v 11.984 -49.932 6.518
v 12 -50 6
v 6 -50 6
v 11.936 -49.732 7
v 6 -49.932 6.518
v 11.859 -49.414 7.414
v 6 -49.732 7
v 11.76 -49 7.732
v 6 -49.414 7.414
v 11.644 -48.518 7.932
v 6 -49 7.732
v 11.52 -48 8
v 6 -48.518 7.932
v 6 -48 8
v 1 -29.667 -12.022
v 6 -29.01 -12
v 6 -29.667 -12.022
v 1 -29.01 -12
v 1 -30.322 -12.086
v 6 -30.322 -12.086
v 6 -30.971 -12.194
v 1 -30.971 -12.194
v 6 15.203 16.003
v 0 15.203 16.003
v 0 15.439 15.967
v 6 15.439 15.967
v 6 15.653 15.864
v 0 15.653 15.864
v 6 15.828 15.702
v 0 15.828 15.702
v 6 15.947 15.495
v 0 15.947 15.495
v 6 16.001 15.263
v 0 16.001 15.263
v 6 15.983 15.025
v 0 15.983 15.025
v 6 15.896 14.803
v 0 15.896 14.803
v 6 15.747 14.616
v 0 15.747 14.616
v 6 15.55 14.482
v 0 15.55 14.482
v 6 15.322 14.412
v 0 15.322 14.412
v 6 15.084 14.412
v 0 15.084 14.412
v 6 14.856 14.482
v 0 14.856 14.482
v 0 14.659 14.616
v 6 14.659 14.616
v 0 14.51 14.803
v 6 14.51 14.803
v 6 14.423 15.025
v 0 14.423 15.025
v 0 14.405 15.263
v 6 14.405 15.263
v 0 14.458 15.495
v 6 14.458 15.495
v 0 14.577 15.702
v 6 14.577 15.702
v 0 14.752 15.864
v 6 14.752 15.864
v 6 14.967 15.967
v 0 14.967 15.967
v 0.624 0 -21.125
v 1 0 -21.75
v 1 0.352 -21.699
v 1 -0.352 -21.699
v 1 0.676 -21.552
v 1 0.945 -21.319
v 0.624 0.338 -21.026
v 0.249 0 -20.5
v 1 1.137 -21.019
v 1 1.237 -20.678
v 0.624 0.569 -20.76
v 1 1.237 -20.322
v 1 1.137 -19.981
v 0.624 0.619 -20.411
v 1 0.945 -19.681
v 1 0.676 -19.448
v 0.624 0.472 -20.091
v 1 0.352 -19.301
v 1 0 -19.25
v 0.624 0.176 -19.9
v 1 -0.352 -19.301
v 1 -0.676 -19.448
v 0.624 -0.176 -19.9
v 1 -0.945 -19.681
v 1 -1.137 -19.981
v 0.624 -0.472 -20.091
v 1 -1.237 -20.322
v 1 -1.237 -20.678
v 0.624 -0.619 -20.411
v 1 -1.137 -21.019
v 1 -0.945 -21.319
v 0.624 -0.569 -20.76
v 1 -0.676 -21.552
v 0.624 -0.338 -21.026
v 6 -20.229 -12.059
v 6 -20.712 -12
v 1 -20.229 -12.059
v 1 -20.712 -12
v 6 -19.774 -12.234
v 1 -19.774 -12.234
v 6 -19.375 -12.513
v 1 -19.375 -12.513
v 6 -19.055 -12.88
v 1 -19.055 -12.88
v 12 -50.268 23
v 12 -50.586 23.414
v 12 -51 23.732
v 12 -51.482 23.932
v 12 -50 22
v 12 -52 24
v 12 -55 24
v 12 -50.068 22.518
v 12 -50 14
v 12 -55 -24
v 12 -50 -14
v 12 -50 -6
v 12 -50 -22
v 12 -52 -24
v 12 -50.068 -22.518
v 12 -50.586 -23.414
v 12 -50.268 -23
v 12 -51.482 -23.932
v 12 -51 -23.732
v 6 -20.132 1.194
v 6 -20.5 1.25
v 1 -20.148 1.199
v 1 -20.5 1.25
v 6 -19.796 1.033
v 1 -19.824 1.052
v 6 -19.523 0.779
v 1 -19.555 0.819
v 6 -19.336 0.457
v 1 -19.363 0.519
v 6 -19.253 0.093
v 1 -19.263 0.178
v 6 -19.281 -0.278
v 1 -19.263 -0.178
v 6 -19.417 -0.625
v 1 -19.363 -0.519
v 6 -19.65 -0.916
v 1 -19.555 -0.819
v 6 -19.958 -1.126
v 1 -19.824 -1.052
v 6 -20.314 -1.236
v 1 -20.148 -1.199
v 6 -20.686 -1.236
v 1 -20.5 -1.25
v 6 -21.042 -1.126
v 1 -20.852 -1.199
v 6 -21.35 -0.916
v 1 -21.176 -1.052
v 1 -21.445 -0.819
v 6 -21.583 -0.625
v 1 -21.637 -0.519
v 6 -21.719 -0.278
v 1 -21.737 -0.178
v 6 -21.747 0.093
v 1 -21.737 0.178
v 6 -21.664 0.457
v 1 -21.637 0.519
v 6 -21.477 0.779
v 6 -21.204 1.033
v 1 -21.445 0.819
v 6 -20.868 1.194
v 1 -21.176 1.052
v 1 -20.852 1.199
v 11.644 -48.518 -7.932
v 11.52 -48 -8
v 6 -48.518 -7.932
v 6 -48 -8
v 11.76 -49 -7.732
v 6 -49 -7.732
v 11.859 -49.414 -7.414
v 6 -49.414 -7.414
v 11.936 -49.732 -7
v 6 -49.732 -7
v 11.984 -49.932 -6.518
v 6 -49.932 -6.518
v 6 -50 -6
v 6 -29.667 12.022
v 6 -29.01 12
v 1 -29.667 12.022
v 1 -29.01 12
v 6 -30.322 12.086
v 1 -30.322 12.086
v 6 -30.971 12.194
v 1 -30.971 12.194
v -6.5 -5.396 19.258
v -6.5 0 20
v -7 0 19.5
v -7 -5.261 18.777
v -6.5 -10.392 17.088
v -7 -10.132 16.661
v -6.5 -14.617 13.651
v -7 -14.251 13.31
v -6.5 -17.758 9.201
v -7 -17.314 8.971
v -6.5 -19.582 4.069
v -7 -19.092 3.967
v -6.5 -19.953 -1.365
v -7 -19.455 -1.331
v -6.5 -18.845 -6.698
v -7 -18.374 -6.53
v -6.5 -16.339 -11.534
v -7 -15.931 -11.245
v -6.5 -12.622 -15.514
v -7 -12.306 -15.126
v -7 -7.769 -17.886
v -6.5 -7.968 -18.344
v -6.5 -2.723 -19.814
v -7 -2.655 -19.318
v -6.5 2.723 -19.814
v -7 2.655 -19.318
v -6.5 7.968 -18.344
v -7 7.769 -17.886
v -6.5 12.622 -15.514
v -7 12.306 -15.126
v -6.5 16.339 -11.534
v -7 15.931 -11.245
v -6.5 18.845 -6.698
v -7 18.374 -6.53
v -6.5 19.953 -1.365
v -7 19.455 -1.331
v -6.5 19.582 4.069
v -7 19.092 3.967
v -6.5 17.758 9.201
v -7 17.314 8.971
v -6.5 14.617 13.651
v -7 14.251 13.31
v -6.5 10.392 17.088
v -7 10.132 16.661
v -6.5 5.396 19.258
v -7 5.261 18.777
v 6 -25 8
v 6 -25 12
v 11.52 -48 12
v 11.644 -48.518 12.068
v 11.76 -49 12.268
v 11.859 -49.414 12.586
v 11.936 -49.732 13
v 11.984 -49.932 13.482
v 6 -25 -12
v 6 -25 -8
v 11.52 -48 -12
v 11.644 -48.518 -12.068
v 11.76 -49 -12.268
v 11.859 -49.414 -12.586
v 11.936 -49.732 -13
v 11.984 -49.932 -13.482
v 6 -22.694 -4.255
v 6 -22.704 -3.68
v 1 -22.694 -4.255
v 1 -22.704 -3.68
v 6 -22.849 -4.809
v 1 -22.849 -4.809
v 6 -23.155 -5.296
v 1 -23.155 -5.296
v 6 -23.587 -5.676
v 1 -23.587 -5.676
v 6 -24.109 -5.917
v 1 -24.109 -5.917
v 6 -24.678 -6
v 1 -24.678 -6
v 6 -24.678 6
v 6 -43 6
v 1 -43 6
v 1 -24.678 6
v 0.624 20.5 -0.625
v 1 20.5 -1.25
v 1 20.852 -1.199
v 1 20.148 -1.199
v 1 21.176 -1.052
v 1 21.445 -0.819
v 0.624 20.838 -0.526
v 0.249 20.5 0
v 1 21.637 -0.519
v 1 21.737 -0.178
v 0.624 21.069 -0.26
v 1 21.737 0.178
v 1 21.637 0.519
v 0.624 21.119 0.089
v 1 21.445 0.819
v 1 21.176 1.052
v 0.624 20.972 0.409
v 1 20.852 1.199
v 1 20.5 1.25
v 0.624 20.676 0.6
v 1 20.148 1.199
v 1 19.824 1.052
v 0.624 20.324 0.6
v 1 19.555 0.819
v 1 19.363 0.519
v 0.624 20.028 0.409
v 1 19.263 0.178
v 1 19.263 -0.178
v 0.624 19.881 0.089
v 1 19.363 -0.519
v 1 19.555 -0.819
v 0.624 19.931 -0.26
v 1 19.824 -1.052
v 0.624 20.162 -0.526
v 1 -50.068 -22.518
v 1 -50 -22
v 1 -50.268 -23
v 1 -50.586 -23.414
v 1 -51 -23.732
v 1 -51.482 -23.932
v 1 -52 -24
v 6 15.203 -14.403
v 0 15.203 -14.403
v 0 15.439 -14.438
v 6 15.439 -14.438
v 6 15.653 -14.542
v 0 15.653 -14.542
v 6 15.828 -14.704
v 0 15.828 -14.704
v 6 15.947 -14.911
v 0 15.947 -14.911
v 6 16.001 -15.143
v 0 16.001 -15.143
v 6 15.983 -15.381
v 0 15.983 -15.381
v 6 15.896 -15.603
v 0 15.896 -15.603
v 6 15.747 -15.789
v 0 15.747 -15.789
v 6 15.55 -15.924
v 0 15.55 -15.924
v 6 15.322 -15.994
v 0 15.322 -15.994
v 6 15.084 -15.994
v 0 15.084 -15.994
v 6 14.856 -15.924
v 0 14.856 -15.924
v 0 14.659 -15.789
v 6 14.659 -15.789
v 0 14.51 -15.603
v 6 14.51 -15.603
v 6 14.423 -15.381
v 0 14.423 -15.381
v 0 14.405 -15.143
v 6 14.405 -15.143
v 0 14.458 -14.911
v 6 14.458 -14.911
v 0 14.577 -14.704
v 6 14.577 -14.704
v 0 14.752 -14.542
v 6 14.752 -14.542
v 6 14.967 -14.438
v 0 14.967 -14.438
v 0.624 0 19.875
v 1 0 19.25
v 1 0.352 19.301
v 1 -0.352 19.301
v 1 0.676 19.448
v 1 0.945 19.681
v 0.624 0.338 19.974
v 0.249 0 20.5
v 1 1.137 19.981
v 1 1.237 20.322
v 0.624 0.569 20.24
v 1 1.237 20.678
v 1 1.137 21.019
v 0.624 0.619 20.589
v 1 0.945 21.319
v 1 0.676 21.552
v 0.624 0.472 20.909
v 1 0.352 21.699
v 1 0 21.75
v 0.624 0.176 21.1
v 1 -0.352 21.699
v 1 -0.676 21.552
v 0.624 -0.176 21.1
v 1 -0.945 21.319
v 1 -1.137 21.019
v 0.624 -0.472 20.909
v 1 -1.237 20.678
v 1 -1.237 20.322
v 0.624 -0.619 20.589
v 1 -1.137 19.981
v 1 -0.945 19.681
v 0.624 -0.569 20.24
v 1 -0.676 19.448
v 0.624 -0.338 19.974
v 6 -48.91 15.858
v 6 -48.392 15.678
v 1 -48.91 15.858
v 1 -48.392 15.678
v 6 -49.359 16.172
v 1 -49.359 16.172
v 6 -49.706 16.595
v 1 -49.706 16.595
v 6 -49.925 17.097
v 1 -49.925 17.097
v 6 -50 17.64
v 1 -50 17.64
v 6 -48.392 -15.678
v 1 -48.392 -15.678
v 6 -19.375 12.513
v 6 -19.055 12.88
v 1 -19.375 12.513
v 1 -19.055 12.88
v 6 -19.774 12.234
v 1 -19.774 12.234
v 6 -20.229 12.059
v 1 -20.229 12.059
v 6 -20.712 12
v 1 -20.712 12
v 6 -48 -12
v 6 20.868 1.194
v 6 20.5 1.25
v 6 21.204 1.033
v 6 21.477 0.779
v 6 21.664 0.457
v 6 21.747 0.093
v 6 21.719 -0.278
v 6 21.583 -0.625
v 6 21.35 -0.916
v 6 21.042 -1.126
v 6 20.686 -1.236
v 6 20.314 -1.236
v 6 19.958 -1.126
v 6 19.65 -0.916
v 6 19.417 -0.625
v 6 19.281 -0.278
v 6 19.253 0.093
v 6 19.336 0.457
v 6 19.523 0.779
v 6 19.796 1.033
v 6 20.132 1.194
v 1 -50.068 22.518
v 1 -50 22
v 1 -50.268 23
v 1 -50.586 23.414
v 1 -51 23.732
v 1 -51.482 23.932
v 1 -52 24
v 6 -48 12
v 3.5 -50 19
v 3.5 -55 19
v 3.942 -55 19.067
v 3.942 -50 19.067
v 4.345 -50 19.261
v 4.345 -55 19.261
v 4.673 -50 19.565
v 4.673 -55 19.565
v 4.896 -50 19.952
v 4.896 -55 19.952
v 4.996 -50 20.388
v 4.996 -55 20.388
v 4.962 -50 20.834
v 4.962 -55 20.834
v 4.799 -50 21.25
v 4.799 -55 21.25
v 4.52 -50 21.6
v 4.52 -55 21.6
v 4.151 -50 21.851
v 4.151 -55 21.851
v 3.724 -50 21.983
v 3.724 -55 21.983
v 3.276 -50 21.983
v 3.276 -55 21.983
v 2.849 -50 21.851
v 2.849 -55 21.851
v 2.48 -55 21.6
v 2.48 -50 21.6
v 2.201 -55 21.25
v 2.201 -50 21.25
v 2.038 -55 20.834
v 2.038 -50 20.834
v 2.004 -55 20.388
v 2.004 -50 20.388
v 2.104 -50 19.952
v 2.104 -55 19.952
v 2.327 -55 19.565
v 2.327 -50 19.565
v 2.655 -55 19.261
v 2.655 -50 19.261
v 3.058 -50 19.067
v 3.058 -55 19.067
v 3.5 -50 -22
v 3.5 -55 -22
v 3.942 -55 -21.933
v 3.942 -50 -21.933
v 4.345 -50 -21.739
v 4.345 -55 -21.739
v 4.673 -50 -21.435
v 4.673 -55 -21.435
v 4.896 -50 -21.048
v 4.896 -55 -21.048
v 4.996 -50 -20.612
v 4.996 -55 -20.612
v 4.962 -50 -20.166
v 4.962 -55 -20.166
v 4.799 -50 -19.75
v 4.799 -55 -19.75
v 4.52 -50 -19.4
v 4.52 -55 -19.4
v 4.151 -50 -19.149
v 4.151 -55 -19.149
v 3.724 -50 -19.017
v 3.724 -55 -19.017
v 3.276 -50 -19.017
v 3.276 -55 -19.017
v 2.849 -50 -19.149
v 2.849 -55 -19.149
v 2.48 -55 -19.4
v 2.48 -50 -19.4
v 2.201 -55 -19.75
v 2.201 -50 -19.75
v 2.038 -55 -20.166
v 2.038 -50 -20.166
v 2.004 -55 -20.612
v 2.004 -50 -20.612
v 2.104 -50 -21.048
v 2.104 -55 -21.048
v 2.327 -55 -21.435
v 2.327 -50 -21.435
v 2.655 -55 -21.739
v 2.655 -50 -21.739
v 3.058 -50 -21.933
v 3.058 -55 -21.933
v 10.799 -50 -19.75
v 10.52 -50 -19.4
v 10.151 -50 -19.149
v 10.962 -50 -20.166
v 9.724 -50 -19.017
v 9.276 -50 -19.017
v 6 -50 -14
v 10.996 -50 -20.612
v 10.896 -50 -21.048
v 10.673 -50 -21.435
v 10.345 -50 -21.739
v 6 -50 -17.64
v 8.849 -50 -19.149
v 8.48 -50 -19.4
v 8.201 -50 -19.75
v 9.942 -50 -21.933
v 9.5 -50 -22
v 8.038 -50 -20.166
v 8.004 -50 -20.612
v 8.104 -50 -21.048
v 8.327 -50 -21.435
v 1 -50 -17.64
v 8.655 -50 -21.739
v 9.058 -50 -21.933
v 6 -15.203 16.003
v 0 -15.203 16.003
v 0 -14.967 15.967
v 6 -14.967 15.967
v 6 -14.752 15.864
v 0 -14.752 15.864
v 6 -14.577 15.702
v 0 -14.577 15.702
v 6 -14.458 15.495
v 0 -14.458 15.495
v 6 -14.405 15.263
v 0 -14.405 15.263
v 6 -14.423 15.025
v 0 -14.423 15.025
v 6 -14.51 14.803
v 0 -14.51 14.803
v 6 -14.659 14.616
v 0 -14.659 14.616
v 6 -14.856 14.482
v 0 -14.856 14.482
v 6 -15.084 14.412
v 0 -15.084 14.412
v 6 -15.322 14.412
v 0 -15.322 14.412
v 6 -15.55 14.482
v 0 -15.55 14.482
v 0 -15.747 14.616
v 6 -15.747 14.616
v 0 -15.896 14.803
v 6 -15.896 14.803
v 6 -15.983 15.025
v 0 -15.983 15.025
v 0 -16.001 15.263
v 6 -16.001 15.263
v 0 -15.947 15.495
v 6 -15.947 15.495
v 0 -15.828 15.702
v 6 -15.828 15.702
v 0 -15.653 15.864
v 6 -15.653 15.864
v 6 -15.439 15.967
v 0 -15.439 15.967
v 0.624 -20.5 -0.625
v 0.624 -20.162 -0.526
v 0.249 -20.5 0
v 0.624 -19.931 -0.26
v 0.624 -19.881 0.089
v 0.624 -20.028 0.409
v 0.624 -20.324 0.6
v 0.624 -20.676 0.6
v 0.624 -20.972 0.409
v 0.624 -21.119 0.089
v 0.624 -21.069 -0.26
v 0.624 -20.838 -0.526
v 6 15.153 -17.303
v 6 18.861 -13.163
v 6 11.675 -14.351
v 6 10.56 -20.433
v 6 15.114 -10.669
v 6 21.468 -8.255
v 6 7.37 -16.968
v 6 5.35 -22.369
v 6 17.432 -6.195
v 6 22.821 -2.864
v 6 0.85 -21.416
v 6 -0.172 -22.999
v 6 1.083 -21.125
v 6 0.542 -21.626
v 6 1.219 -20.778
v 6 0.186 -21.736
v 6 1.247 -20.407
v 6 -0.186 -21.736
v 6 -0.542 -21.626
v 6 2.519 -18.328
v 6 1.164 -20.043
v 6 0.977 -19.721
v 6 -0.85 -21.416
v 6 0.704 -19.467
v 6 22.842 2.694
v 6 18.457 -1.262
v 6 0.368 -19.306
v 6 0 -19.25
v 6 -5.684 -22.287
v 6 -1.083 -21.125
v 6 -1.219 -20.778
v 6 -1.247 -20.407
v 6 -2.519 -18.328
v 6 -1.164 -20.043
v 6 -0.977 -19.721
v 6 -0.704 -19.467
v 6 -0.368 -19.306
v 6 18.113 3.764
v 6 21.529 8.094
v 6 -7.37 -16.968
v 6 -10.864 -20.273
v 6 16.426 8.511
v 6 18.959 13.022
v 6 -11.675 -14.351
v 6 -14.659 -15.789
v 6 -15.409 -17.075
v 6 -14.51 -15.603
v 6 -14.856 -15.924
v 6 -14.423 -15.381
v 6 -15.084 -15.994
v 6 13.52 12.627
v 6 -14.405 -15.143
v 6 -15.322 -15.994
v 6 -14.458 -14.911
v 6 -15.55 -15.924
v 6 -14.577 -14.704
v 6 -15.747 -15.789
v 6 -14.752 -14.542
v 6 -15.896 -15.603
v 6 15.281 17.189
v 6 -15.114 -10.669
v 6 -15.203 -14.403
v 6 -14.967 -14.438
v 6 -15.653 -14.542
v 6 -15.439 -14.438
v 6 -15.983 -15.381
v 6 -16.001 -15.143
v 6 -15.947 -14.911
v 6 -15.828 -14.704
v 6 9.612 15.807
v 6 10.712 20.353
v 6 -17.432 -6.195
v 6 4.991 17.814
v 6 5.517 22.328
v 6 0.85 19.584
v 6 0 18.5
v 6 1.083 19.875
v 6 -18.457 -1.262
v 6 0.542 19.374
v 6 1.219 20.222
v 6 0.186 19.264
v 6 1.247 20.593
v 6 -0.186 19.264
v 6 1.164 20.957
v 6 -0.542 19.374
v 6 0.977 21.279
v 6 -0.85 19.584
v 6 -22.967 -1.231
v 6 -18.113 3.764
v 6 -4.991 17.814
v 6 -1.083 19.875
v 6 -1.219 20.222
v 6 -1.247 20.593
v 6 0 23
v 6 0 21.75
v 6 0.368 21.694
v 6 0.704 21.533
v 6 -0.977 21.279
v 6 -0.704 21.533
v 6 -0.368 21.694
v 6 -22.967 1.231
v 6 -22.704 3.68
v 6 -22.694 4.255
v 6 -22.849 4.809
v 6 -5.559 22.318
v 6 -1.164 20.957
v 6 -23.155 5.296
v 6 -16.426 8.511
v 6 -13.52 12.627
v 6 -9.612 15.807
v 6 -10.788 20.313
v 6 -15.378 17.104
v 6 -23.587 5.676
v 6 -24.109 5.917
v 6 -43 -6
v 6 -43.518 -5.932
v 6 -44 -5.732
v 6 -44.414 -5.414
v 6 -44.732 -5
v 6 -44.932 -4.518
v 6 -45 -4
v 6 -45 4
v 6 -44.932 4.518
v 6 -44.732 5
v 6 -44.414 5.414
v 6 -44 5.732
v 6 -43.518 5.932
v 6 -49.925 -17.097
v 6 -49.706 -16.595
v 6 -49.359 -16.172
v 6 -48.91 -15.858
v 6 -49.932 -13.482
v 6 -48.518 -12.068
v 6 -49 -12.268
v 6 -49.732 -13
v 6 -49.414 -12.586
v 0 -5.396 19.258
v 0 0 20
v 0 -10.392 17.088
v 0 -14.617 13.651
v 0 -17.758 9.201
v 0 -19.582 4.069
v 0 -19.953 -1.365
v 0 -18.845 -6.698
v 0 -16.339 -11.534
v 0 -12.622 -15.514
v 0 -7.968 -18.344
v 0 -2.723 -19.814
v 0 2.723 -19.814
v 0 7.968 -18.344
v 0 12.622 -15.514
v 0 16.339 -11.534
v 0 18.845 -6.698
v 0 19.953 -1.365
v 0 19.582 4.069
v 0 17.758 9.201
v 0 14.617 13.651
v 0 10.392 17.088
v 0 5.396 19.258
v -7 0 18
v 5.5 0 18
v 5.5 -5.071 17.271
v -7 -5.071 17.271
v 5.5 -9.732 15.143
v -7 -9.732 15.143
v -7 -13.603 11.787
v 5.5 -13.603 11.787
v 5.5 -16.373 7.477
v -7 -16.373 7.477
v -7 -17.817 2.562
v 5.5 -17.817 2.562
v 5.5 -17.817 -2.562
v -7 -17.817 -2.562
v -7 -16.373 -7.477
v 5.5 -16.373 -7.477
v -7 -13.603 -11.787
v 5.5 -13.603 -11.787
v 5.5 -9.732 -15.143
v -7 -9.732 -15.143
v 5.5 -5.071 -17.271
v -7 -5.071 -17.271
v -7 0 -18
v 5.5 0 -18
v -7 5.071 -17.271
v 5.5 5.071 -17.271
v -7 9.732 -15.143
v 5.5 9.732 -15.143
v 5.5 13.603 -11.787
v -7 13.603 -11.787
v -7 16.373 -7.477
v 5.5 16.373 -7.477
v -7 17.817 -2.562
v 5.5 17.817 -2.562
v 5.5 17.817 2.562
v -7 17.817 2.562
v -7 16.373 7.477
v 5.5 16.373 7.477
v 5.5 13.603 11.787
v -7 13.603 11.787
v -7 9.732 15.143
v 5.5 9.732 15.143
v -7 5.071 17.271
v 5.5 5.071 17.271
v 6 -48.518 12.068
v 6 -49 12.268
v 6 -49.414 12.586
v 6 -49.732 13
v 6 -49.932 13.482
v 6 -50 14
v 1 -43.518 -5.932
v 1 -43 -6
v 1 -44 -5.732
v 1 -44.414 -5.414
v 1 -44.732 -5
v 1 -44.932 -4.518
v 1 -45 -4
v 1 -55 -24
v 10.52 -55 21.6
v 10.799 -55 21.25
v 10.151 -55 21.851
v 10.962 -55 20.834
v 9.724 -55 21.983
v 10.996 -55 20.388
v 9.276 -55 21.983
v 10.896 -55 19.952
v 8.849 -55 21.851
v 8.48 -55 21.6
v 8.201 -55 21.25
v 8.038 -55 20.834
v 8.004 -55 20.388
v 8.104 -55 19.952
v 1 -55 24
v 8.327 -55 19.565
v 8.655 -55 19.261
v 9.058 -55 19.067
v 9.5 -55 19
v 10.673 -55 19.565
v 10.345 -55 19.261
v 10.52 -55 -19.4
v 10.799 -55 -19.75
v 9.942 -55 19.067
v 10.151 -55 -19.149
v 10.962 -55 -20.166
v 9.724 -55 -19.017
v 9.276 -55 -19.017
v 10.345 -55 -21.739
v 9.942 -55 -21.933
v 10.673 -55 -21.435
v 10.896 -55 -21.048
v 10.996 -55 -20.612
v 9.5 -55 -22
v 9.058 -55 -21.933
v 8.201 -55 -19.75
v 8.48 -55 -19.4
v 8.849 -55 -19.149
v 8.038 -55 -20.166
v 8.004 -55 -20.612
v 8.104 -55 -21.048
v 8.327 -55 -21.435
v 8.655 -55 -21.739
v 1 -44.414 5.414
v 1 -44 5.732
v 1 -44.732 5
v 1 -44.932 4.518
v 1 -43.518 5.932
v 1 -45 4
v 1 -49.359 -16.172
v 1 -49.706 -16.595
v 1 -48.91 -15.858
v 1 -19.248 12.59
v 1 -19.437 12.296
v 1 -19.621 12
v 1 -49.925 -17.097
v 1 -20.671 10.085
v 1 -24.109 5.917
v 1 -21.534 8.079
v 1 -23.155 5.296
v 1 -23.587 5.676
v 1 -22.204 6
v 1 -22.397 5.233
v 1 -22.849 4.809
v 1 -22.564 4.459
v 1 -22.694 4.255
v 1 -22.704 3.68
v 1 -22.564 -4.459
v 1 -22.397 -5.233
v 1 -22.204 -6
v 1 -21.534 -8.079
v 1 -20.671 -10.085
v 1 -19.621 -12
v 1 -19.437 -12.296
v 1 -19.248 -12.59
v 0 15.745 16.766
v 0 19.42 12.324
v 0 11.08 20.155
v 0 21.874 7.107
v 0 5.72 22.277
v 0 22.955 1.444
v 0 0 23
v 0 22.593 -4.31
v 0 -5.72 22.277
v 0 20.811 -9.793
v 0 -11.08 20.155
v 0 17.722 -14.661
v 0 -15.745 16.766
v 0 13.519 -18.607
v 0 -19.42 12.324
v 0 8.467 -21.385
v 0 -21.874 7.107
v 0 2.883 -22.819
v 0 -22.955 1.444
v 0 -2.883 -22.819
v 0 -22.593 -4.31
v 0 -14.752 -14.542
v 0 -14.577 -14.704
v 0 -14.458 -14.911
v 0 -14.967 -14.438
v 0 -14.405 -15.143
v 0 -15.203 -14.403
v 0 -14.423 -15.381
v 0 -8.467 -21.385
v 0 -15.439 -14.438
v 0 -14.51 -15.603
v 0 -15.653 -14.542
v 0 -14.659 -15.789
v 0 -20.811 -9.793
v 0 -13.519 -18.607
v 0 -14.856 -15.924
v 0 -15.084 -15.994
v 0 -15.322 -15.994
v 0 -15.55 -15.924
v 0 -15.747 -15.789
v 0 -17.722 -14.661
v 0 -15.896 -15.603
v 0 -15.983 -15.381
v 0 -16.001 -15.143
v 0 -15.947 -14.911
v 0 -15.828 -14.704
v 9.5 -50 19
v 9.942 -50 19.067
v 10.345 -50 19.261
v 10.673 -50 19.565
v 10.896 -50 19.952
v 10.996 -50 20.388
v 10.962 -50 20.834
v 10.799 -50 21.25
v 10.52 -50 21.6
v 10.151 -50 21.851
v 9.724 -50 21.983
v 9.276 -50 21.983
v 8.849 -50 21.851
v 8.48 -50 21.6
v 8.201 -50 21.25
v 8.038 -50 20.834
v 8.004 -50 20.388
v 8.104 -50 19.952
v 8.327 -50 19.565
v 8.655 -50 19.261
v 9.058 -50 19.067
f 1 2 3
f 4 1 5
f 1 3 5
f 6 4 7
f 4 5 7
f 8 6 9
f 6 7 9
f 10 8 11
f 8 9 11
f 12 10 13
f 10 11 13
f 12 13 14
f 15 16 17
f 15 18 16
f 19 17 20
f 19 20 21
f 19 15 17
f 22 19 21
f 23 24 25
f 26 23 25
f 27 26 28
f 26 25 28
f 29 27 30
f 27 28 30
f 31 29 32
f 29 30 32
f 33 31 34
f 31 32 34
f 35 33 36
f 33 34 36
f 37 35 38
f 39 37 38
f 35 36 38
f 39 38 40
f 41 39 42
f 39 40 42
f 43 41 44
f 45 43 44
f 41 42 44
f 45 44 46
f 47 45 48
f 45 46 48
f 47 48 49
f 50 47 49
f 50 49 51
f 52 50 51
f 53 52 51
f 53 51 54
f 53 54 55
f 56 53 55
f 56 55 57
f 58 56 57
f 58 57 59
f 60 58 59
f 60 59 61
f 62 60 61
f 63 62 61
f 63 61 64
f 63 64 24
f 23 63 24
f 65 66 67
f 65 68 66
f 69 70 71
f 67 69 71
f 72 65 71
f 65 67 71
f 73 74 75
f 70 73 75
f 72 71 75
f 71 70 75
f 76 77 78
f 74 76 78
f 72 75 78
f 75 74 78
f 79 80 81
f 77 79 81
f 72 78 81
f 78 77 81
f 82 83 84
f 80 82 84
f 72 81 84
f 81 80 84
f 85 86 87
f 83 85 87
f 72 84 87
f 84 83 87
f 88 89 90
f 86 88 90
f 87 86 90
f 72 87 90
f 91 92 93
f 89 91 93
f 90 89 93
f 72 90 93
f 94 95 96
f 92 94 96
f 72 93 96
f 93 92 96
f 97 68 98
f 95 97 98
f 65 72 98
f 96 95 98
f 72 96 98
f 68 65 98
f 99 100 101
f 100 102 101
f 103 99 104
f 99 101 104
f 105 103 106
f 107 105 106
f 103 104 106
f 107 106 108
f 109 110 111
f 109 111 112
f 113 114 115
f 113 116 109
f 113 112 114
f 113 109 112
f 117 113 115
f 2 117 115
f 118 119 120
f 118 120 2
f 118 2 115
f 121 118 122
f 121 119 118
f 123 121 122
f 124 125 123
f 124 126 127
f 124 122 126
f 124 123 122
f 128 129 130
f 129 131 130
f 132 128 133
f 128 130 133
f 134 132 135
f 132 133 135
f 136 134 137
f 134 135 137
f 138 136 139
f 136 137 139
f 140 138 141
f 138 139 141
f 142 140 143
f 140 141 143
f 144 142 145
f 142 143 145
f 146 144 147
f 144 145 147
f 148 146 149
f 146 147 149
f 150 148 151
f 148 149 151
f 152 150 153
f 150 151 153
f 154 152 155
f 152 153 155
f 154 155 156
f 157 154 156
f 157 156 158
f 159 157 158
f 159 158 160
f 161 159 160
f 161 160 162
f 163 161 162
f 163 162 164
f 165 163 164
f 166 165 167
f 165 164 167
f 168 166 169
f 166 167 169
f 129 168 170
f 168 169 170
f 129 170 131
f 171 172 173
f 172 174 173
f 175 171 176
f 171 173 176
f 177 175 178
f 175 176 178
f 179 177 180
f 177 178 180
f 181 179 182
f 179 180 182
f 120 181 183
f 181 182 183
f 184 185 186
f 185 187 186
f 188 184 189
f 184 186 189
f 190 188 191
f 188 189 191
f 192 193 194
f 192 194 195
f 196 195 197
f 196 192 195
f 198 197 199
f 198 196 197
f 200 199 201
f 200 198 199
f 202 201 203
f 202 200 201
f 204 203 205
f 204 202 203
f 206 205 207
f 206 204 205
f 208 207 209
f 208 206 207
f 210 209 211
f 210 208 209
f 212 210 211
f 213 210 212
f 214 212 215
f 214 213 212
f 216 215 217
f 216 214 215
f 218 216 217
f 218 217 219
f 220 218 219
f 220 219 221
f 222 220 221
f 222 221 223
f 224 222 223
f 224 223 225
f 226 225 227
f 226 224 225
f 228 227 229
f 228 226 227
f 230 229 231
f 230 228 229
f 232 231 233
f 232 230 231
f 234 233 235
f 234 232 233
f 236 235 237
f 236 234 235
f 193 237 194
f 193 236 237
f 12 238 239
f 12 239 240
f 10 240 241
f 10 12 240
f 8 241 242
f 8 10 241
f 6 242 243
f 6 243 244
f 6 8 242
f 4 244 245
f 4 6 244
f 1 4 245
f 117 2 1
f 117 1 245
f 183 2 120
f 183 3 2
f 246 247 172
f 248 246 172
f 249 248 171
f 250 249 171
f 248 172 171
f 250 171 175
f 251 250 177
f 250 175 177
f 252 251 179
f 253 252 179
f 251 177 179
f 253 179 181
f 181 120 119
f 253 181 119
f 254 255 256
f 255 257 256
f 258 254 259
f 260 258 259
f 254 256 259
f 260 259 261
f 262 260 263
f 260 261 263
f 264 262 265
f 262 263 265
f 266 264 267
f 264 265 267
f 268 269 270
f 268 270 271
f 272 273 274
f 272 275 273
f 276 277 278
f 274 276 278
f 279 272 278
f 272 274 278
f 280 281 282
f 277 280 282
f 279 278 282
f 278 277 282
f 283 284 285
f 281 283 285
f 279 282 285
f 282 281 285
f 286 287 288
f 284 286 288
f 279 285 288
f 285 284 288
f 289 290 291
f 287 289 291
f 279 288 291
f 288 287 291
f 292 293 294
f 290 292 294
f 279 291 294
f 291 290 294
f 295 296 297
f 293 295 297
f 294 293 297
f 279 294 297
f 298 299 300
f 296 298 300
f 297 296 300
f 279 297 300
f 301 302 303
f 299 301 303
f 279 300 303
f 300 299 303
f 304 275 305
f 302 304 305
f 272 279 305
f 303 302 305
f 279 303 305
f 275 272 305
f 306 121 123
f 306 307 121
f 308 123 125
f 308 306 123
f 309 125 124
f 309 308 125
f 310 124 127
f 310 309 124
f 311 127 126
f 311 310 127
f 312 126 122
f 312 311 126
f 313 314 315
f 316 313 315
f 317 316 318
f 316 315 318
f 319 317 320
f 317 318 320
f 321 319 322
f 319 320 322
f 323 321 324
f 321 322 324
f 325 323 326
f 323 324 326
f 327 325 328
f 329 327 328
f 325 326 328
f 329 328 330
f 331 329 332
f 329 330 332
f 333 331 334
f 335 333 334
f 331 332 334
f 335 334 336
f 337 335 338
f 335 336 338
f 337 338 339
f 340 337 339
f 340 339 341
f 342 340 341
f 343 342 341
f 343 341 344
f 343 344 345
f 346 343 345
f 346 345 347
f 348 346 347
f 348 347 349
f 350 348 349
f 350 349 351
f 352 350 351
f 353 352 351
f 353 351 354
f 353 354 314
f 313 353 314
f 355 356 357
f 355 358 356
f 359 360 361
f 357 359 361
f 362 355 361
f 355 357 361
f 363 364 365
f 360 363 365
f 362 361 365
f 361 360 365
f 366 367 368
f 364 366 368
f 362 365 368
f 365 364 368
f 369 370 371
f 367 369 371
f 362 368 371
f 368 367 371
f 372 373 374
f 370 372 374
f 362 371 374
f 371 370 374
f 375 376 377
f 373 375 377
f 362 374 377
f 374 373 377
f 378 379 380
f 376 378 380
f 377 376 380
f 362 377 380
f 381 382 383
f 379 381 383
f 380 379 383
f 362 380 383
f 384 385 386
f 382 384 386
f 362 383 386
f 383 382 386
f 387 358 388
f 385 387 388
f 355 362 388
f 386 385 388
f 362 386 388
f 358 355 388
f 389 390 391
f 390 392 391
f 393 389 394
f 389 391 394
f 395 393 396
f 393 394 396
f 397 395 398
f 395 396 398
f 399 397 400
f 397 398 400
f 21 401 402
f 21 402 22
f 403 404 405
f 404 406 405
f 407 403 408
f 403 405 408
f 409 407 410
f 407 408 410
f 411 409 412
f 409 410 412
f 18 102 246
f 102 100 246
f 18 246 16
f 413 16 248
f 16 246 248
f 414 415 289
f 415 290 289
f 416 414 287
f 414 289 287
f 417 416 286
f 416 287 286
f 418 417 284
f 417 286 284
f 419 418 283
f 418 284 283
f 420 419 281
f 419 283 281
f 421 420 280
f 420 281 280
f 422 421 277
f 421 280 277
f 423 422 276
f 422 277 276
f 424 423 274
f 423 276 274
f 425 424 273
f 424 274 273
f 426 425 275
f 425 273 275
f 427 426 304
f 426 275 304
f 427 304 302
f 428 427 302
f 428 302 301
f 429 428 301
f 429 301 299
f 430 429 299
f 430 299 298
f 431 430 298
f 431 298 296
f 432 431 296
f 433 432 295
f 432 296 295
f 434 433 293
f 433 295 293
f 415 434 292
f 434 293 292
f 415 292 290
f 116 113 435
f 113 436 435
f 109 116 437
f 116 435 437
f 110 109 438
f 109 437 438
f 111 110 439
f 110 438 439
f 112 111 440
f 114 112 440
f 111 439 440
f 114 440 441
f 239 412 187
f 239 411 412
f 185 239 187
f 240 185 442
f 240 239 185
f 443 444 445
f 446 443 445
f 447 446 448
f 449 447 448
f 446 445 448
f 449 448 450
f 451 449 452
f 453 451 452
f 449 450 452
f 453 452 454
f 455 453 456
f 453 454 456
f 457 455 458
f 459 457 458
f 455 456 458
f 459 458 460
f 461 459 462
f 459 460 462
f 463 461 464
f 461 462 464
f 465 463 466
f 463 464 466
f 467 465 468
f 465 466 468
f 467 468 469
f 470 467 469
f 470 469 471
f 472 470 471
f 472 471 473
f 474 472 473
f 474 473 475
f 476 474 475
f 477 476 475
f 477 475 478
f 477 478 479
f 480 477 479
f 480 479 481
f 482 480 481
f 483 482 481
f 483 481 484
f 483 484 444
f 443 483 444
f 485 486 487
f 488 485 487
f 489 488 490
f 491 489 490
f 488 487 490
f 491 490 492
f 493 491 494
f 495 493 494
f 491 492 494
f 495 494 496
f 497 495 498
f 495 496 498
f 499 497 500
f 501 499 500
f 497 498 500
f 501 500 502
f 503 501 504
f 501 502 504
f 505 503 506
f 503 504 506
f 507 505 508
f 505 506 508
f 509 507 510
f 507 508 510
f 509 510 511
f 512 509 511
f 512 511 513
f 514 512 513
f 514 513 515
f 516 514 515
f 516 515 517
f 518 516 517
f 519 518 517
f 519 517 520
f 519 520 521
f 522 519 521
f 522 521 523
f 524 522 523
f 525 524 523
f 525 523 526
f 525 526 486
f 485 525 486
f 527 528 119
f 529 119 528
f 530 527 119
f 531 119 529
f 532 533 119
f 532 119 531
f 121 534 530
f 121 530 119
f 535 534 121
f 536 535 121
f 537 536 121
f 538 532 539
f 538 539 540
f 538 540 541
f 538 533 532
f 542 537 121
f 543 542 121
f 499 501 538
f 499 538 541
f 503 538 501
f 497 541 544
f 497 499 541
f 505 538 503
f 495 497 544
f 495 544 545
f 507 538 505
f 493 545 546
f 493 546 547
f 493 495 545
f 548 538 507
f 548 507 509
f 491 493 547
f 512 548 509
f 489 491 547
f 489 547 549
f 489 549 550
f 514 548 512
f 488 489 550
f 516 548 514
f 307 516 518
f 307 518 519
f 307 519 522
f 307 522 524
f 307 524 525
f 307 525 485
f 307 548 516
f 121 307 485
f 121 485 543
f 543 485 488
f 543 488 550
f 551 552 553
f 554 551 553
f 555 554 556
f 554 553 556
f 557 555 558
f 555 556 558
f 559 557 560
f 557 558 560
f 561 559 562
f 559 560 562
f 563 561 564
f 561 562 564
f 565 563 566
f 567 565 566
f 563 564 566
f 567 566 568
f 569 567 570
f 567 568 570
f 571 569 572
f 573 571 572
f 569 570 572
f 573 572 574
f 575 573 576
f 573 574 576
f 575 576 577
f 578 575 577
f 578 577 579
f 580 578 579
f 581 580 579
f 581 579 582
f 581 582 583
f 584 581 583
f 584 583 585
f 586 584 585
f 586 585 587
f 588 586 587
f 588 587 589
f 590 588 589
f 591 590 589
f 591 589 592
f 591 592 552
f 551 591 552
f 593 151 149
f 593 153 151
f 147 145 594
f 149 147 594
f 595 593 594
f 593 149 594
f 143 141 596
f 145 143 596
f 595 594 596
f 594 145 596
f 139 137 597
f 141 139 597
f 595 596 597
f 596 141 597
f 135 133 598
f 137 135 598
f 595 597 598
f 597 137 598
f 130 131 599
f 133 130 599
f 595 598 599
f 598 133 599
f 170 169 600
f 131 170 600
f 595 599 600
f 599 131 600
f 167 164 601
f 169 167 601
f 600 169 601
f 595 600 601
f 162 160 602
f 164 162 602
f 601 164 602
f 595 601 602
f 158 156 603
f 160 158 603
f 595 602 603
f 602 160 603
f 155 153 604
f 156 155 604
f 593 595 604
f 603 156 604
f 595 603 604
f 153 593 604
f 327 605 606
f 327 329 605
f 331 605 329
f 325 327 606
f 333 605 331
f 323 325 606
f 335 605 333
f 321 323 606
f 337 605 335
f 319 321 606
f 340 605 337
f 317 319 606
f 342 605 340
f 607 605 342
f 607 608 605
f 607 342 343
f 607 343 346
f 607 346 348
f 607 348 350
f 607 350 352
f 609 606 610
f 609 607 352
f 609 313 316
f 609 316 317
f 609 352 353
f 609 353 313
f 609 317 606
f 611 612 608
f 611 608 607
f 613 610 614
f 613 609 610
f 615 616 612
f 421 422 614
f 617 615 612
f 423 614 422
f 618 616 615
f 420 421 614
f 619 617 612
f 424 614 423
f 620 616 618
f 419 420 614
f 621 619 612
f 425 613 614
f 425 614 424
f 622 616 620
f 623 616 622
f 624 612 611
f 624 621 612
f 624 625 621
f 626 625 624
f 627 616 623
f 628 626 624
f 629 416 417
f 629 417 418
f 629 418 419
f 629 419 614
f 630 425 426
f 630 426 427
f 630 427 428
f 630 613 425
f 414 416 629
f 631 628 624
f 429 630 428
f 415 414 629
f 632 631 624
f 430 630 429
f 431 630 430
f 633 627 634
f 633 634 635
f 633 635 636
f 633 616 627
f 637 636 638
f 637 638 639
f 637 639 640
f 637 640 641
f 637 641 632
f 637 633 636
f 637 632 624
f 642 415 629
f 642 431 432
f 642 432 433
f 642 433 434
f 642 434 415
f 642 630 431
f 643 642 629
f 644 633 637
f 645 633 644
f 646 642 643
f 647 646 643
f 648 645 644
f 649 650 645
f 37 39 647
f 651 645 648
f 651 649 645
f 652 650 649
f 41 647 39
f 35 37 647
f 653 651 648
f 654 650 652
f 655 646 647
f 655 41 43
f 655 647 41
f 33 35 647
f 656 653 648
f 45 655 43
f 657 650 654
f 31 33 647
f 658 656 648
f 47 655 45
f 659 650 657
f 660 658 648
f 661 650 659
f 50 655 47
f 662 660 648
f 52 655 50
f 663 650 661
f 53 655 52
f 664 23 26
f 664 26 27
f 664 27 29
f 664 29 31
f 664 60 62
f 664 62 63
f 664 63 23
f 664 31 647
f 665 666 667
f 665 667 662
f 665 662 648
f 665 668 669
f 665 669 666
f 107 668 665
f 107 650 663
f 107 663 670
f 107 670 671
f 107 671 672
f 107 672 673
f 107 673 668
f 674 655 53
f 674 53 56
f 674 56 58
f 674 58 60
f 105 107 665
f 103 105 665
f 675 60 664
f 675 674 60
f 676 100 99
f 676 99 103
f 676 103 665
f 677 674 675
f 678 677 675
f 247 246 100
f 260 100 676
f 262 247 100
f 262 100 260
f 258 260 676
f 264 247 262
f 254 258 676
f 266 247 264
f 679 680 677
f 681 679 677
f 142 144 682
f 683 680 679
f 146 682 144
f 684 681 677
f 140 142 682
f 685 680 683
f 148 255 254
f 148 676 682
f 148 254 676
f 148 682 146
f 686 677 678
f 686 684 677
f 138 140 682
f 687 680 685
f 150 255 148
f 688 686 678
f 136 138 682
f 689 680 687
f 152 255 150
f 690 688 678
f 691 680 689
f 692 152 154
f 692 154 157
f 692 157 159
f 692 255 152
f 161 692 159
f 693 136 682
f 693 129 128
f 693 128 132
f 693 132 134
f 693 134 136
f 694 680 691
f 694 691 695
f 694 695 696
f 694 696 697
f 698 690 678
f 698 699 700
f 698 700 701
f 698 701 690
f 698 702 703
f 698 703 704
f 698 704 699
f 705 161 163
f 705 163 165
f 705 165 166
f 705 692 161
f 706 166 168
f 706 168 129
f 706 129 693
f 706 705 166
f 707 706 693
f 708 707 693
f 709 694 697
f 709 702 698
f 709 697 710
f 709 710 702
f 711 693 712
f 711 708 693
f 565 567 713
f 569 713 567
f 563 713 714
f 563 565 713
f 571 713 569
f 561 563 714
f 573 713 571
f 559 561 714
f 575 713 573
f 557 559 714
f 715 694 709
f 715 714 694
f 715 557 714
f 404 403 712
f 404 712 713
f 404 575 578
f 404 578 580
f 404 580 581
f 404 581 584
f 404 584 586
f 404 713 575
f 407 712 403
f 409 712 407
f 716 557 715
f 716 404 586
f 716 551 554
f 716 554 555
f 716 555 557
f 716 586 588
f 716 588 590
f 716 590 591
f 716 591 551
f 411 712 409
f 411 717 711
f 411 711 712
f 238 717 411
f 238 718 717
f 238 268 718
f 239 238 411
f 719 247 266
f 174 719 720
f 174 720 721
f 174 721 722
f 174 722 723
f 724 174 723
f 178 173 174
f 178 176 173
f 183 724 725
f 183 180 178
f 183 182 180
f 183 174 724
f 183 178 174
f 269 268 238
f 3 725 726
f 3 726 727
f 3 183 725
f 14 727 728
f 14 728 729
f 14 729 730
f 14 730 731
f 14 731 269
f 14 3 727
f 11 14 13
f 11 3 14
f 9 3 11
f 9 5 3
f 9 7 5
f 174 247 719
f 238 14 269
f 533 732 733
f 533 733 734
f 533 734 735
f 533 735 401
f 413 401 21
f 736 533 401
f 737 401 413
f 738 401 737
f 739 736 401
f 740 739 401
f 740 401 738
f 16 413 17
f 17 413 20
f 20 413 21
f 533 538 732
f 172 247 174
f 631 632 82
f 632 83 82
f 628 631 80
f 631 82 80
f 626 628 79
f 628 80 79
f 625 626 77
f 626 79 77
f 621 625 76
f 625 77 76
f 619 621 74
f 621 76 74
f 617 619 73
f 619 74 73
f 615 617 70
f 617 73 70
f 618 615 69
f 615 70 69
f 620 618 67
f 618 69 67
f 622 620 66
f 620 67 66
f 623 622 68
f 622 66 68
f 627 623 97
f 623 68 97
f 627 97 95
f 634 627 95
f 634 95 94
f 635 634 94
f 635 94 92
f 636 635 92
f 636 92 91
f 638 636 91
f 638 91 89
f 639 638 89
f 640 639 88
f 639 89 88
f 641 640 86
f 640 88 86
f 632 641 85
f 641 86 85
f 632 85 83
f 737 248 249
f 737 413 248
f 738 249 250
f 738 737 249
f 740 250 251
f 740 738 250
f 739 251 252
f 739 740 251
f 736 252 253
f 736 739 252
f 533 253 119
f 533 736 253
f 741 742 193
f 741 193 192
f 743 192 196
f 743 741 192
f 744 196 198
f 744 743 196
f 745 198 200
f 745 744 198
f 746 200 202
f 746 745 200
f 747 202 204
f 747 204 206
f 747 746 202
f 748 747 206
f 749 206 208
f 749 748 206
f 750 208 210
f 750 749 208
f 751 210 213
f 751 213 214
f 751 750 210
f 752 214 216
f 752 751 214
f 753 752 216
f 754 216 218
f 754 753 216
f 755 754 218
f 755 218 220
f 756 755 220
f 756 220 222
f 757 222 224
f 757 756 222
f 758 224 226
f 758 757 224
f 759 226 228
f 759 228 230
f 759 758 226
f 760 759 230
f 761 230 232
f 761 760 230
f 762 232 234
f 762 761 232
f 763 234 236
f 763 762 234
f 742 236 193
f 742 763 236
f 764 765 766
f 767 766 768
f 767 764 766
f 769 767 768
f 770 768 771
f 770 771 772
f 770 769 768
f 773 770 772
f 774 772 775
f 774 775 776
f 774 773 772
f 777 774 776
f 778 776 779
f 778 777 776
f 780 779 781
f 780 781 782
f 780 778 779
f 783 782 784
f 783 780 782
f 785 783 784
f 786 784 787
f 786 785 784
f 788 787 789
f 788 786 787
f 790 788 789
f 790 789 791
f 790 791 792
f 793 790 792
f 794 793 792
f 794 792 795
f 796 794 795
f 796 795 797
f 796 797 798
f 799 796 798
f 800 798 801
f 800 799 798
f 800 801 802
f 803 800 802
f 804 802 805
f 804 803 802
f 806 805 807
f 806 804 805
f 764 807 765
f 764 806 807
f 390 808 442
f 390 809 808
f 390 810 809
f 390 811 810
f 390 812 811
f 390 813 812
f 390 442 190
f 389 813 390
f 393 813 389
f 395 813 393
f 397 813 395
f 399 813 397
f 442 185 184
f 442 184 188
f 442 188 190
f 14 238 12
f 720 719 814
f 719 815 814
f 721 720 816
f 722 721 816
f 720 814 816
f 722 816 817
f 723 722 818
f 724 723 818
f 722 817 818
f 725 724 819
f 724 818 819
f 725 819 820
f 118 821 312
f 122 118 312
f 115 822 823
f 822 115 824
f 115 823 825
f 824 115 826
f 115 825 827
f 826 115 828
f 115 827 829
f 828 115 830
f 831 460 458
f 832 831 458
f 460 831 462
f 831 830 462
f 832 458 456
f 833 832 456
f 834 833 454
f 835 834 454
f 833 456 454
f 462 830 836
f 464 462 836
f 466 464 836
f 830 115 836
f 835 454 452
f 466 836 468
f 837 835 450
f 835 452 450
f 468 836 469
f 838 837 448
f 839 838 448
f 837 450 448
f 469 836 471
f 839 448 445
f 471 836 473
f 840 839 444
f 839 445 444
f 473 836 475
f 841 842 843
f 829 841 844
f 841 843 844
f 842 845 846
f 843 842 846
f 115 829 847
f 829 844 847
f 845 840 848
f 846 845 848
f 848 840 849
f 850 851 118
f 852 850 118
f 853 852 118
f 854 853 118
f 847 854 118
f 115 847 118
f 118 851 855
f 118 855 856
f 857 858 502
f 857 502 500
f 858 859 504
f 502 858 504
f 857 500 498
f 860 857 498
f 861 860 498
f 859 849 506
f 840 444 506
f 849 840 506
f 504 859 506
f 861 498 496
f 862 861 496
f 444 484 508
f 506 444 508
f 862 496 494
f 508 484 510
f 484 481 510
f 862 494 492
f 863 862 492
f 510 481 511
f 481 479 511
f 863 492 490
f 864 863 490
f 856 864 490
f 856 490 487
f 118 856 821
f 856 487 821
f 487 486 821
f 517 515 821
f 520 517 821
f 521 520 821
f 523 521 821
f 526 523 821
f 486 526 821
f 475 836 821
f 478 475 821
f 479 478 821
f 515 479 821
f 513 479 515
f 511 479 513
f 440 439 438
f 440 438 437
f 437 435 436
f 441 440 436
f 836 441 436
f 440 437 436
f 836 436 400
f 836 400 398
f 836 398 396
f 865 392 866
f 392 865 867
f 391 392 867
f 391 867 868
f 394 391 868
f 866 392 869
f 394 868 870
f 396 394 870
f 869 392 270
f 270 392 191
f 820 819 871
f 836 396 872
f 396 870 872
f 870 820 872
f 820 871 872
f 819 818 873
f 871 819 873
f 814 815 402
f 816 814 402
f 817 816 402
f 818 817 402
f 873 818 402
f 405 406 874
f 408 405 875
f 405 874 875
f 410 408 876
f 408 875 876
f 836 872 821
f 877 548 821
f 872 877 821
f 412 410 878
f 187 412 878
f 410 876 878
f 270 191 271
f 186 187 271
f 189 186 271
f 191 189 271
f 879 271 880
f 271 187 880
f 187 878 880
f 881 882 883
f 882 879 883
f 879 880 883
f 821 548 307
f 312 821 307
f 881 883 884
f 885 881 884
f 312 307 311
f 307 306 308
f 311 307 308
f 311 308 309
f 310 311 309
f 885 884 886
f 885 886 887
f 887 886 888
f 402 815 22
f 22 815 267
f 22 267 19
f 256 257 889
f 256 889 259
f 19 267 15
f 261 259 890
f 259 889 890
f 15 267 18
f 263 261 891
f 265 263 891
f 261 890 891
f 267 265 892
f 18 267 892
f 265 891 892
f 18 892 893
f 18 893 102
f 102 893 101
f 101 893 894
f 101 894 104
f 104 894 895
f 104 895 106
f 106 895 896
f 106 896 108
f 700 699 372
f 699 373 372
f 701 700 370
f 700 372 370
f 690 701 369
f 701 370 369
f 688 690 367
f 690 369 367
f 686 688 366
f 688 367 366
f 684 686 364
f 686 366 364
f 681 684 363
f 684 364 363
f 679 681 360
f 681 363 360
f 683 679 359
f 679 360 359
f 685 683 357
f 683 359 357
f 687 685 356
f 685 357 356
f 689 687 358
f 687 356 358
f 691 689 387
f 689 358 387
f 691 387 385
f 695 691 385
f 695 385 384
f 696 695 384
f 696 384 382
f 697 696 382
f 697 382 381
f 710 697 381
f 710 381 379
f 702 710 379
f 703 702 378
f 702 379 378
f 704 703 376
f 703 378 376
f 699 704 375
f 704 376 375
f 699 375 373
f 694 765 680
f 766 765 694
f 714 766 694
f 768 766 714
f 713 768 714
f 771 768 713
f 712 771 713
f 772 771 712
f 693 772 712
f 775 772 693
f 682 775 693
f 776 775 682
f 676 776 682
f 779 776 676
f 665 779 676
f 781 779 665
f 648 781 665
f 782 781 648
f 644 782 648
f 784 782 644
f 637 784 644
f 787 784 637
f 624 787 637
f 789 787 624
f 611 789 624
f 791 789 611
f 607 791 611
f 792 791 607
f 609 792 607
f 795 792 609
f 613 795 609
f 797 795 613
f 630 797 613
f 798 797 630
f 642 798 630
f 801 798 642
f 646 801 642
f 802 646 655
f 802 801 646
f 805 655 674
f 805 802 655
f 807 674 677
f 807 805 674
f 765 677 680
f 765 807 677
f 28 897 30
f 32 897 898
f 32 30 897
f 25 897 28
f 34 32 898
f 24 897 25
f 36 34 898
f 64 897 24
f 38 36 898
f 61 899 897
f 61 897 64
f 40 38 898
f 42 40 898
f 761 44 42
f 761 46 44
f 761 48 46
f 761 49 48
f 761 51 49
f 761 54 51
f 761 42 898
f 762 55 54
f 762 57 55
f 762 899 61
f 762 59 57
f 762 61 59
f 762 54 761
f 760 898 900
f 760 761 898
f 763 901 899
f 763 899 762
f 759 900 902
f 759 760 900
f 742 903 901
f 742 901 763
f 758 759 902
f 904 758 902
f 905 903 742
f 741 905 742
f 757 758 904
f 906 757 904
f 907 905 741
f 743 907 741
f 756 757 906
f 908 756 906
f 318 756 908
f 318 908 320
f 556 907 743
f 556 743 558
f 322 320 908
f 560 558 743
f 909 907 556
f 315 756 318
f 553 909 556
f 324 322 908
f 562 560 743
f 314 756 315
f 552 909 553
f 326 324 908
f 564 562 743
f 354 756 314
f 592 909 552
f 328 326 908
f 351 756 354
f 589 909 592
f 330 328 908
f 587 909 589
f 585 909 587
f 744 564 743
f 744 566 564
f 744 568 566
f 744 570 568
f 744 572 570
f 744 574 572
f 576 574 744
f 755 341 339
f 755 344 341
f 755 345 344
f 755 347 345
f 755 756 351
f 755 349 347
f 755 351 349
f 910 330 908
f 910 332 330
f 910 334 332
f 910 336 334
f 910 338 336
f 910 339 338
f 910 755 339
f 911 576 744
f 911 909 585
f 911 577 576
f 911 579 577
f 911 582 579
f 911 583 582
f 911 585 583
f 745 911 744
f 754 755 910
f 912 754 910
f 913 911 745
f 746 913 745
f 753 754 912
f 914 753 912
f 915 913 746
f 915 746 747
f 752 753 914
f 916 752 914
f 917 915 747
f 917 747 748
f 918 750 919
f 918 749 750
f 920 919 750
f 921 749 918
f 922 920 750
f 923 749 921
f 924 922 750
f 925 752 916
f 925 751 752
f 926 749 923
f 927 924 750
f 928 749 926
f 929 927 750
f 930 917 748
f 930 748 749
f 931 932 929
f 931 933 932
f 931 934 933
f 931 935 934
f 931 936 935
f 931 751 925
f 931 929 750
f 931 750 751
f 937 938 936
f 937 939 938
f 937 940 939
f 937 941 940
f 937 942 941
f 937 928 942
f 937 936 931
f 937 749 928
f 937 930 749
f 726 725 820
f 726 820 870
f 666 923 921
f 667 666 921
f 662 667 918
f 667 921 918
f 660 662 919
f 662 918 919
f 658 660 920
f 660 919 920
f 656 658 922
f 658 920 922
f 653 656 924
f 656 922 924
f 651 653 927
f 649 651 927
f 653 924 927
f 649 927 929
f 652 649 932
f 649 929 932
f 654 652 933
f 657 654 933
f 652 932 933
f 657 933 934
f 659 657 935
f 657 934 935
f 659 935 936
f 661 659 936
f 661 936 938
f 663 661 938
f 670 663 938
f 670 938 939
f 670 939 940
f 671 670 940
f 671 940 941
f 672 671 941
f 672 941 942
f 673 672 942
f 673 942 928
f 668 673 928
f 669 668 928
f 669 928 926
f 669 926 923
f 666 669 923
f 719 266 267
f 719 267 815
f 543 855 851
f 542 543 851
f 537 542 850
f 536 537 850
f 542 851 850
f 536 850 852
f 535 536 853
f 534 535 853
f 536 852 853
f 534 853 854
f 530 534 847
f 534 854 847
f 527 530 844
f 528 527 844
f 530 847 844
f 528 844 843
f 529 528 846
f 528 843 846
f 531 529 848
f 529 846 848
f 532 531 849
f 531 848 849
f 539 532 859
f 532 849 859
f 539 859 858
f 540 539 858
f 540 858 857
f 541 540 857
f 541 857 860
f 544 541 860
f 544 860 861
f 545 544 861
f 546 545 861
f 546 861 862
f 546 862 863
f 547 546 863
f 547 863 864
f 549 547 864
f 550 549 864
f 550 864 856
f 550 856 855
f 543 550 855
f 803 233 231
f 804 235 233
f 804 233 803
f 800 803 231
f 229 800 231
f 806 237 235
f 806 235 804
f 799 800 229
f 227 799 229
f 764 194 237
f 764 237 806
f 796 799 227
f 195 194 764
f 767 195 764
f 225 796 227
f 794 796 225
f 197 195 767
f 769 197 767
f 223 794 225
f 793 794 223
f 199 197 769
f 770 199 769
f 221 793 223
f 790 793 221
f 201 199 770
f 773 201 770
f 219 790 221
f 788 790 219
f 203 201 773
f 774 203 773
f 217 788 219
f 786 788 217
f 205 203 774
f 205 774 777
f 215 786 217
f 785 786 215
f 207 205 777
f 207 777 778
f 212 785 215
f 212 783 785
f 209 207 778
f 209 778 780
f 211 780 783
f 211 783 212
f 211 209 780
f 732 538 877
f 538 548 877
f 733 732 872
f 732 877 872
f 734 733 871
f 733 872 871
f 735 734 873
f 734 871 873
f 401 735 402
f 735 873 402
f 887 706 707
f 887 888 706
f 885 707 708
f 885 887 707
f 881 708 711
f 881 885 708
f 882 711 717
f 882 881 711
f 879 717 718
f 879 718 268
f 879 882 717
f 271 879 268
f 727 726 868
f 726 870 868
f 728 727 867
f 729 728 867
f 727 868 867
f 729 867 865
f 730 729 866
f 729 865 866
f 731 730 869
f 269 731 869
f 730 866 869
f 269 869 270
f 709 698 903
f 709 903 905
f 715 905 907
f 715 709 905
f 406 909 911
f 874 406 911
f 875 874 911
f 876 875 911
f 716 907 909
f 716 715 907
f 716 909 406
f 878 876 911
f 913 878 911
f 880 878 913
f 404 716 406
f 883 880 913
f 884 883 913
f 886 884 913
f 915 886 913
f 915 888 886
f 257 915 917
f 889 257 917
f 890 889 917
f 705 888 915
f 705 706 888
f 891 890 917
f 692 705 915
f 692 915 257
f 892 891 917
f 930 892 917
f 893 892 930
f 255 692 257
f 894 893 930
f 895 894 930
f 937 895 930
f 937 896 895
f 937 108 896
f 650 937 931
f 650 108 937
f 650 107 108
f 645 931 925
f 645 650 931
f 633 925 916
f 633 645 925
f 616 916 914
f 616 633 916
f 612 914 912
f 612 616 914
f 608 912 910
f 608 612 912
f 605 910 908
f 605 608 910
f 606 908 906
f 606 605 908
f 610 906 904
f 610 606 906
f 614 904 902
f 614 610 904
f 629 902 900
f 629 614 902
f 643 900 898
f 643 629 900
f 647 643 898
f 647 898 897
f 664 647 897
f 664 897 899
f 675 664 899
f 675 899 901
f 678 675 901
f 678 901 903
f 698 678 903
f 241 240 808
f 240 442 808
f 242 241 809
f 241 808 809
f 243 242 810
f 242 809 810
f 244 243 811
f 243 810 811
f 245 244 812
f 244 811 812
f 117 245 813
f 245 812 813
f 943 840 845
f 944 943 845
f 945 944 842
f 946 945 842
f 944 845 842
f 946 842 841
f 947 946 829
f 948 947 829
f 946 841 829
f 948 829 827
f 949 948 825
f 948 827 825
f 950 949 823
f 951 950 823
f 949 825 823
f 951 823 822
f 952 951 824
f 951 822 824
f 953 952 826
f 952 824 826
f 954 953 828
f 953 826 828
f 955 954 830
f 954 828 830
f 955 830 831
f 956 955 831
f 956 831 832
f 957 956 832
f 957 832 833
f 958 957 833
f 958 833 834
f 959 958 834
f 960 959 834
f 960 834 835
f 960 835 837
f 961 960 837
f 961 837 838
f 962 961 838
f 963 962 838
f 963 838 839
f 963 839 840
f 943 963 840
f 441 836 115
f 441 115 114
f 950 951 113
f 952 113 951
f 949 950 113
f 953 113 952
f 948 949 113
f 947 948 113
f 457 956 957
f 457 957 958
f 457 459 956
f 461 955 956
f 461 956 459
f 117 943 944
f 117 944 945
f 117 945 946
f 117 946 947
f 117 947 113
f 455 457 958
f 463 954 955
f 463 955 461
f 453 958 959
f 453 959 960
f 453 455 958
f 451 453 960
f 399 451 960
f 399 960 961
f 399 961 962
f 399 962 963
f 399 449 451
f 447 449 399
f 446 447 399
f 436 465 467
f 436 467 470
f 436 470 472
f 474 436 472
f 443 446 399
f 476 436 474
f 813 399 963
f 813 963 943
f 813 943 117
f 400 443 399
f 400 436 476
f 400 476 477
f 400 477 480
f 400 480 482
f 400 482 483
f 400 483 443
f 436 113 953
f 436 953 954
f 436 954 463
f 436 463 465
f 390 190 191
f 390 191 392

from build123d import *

# Parameters (mm, degrees)
EXTRUDE_1_DEPTH        = 5
SKETCH_16_W            = 48
SKETCH_16_H            = 5
EXTRUDE_3_DEPTH        = 11
CUT_EXTRUDE_4_REACH    = 84.486
SKETCH_5_R             = 1.5
RIB_1_REACH            = 68.821
SKETCH_17_WALL_W       = 161.351231242
SKETCH_17_WALL_H       = 4
FILLET_1_R             = 2
HOLE_WIZARD_M3_2_D     = 2.5
HOLE_WIZARD_M3_2_DEPTH = 5
HOLE_WIZARD_M3_2_TIP   = 0.751075774
HOLE_WIZARD_M2_1_D     = 1.6
CHAMFER_1_SIZE         = 0.5
FILLET_2_R             = 10


with BuildPart() as part:
    # 草图3 → 旋转1 (revolve)
    with BuildSketch(Plane.XY, mode=Mode.PRIVATE) as revolve_1_sk:
        Polygon((6, 18), (-7, 18), (-7, 20), (0, 20), (0, 23), (6, 23), align=None)
    revolve(revolve_1_sk.sketch.rotate(Axis((-123.647082632, 0, 0), (1, 0, 0)), 90), axis=Axis((-123.647082632, 0, 0), (1, 0, 0)))

    # 草图4 → 凸台-拉伸1 (add)
    with BuildSketch(Plane(origin=(6, 0, 0), x_dir=(0, 0, -1), z_dir=(1, 0, 0))):
        with BuildLine():
            Line((-12, -19.62141687), (-12, -30))
            Line((-12, -30), (-16, -50))
            Line((-16, -50), (-24, -50))
            Line((-24, -50), (-24, -55))
            Line((-24, -55), (24, -55))
            Line((24, -55), (24, -50))
            Line((24, -50), (16, -50))
            Line((16, -50), (12, -30))
            Line((12, -30), (12, -19.62141687))
            ThreePointArc((12, -19.62141687), (9.092135156, -21.126596467), (6, -22.203603311))
            Line((6, -22.203603311), (6, -45))
            Line((6, -45), (-6, -45))
            Line((-6, -45), (-6, -22.203603311))
            ThreePointArc((-6, -22.203603311), (-9.092135156, -21.126596467), (-12, -19.62141687))
        make_face()
    extrude(amount=-EXTRUDE_1_DEPTH)

    # 草图16 → 凸台-拉伸3 (add)
    with BuildSketch(Plane(origin=(1, 0, 0), x_dir=(0, 0, -1), z_dir=(1, 0, 0))):
        with Locations((0, -52.5)):
            Rectangle(SKETCH_16_W, SKETCH_16_H)
    extrude(amount=EXTRUDE_3_DEPTH)

    # 草图5 → 切除-拉伸4 (cut, up to next)
    with BuildSketch(Plane.XZ.offset(55), mode=Mode.PRIVATE) as cut_extrude_4_sk1:
        with Locations(Location((9.5, 20.5, 0), (0, 0, 270))):
            Circle(SKETCH_5_R)
    cut_extrude_4_tool1 = extrude(cut_extrude_4_sk1.sketch, amount=-CUT_EXTRUDE_4_REACH, mode=Mode.PRIVATE) & part.part
    # 草图5 → 切除-拉伸4 (cut, up to next)
    with BuildSketch(Plane.XZ.offset(55), mode=Mode.PRIVATE) as cut_extrude_4_sk2:
        with Locations(Location((9.5, -20.5, 0), (0, 0, 270))):
            Circle(SKETCH_5_R)
    cut_extrude_4_tool2 = extrude(cut_extrude_4_sk2.sketch, amount=-CUT_EXTRUDE_4_REACH, mode=Mode.PRIVATE) & part.part
    # 草图5 → 切除-拉伸4 (cut, up to next)
    with BuildSketch(Plane.XZ.offset(55), mode=Mode.PRIVATE) as cut_extrude_4_sk3:
        with Locations(Location((3.5, -20.5, 0), (0, 0, 270))):
            Circle(SKETCH_5_R)
    cut_extrude_4_tool3 = extrude(cut_extrude_4_sk3.sketch, amount=-CUT_EXTRUDE_4_REACH, mode=Mode.PRIVATE) & part.part
    # 草图5 → 切除-拉伸4 (cut, up to next)
    with BuildSketch(Plane.XZ.offset(55), mode=Mode.PRIVATE) as cut_extrude_4_sk4:
        with Locations(Location((3.5, 20.5, 0), (0, 0, 270))):
            Circle(SKETCH_5_R)
    cut_extrude_4_tool4 = extrude(cut_extrude_4_sk4.sketch, amount=-CUT_EXTRUDE_4_REACH, mode=Mode.PRIVATE) & part.part
    add(cut_extrude_4_tool1.solids().sort_by_distance((9.5, -55, 20.5))[0], mode=Mode.SUBTRACT)
    add(cut_extrude_4_tool2.solids().sort_by_distance((9.5, -55, -20.5))[0], mode=Mode.SUBTRACT)
    add(cut_extrude_4_tool3.solids().sort_by_distance((3.5, -55, -20.5))[0], mode=Mode.SUBTRACT)
    add(cut_extrude_4_tool4.solids().sort_by_distance((3.5, -55, 20.5))[0], mode=Mode.SUBTRACT)

    # 草图17 wall → 筋1 (add, up to next)
    with BuildSketch(Plane(origin=(9, -37.5, 12), x_dir=(0.233372952475, -0.972387301981, 0), z_dir=(0.972387301981, 0.233372952475, 0)), mode=Mode.PRIVATE) as rib_1_sk1:
        with Locations((0, 2)):
            Rectangle(SKETCH_17_WALL_W, SKETCH_17_WALL_H)
    rib_1_tool1 = extrude(rib_1_sk1.sketch, amount=-RIB_1_REACH, mode=Mode.PRIVATE) - part.part
    rib_1 = rib_1_tool1.solids().sort_by_distance((9, -37.5, 12))[0]
    add(rib_1)

    # 镜向1: 筋1 across plane
    add(rib_1.mirror(Plane.XY))

    # 圆角1
    fillet_1_edges = [part.edges().sort_by_distance(p)[0] for p in [
        (9, -50, 12),
        (9, -50, 8),
        (9, -50, -8),
        (9, -50, -12),
        (3.5, -22.203603311, -6),
        (3.5, -19.62141687, -12),
        (3.5, -50, -16),
        (6.5, -50, -24),
        (6.5, -50, 24),
        (3.5, -50, 16),
        (3.5, -19.62141687, 12),
        (3.5, -22.203603311, 6),
        (3.5, -45, 6),
        (3.5, -45, -6),
    ]]
    fillet(fillet_1_edges, radius=FILLET_1_R - 0.0001)  # a hair under: the kernel refuses the full size

    # M3 螺纹孔2
    with Locations(Plane(origin=(6, 0, 0), x_dir=(0, 0, -1), z_dir=(1, 0, 0))):
        with Locations((0, 20.5), (-20.5, 0), (0, -20.5), (20.5, 0)):
            Hole(HOLE_WIZARD_M3_2_D / 2, depth=HOLE_WIZARD_M3_2_DEPTH)
            with Locations((0, 0, -(HOLE_WIZARD_M3_2_DEPTH + HOLE_WIZARD_M3_2_TIP / 2))):  # 118° drill point
                Cone(0, HOLE_WIZARD_M3_2_D / 2, HOLE_WIZARD_M3_2_TIP, mode=Mode.SUBTRACT)

    # M2 螺纹孔1 (through all)
    with Locations(Plane(origin=(6, 0, 0), x_dir=(0, 0, -1), z_dir=(1, 0, 0))):
        with Locations((-15.202795796, 15.202795796), (15.202795796, 15.202795796), (15.202795796, -15.202795796), (-15.202795796, -15.202795796)):
            Hole(HOLE_WIZARD_M2_1_D / 2)

    # 倒角1
    chamfer_1_edges = [part.edges().sort_by_distance(p)[0] for p in [
        (6, 0, -18),
        (-7, 0, -20),
    ]]
    chamfer(chamfer_1_edges, length=CHAMFER_1_SIZE)

    # 圆角2
    fillet_2_edges = [part.edges().sort_by_distance(p)[0] for p in [
        (3.5, -30, 12),
        (3.5, -30, -12),
    ]]
    fillet(fillet_2_edges, radius=FILLET_2_R)


solid = part.part
